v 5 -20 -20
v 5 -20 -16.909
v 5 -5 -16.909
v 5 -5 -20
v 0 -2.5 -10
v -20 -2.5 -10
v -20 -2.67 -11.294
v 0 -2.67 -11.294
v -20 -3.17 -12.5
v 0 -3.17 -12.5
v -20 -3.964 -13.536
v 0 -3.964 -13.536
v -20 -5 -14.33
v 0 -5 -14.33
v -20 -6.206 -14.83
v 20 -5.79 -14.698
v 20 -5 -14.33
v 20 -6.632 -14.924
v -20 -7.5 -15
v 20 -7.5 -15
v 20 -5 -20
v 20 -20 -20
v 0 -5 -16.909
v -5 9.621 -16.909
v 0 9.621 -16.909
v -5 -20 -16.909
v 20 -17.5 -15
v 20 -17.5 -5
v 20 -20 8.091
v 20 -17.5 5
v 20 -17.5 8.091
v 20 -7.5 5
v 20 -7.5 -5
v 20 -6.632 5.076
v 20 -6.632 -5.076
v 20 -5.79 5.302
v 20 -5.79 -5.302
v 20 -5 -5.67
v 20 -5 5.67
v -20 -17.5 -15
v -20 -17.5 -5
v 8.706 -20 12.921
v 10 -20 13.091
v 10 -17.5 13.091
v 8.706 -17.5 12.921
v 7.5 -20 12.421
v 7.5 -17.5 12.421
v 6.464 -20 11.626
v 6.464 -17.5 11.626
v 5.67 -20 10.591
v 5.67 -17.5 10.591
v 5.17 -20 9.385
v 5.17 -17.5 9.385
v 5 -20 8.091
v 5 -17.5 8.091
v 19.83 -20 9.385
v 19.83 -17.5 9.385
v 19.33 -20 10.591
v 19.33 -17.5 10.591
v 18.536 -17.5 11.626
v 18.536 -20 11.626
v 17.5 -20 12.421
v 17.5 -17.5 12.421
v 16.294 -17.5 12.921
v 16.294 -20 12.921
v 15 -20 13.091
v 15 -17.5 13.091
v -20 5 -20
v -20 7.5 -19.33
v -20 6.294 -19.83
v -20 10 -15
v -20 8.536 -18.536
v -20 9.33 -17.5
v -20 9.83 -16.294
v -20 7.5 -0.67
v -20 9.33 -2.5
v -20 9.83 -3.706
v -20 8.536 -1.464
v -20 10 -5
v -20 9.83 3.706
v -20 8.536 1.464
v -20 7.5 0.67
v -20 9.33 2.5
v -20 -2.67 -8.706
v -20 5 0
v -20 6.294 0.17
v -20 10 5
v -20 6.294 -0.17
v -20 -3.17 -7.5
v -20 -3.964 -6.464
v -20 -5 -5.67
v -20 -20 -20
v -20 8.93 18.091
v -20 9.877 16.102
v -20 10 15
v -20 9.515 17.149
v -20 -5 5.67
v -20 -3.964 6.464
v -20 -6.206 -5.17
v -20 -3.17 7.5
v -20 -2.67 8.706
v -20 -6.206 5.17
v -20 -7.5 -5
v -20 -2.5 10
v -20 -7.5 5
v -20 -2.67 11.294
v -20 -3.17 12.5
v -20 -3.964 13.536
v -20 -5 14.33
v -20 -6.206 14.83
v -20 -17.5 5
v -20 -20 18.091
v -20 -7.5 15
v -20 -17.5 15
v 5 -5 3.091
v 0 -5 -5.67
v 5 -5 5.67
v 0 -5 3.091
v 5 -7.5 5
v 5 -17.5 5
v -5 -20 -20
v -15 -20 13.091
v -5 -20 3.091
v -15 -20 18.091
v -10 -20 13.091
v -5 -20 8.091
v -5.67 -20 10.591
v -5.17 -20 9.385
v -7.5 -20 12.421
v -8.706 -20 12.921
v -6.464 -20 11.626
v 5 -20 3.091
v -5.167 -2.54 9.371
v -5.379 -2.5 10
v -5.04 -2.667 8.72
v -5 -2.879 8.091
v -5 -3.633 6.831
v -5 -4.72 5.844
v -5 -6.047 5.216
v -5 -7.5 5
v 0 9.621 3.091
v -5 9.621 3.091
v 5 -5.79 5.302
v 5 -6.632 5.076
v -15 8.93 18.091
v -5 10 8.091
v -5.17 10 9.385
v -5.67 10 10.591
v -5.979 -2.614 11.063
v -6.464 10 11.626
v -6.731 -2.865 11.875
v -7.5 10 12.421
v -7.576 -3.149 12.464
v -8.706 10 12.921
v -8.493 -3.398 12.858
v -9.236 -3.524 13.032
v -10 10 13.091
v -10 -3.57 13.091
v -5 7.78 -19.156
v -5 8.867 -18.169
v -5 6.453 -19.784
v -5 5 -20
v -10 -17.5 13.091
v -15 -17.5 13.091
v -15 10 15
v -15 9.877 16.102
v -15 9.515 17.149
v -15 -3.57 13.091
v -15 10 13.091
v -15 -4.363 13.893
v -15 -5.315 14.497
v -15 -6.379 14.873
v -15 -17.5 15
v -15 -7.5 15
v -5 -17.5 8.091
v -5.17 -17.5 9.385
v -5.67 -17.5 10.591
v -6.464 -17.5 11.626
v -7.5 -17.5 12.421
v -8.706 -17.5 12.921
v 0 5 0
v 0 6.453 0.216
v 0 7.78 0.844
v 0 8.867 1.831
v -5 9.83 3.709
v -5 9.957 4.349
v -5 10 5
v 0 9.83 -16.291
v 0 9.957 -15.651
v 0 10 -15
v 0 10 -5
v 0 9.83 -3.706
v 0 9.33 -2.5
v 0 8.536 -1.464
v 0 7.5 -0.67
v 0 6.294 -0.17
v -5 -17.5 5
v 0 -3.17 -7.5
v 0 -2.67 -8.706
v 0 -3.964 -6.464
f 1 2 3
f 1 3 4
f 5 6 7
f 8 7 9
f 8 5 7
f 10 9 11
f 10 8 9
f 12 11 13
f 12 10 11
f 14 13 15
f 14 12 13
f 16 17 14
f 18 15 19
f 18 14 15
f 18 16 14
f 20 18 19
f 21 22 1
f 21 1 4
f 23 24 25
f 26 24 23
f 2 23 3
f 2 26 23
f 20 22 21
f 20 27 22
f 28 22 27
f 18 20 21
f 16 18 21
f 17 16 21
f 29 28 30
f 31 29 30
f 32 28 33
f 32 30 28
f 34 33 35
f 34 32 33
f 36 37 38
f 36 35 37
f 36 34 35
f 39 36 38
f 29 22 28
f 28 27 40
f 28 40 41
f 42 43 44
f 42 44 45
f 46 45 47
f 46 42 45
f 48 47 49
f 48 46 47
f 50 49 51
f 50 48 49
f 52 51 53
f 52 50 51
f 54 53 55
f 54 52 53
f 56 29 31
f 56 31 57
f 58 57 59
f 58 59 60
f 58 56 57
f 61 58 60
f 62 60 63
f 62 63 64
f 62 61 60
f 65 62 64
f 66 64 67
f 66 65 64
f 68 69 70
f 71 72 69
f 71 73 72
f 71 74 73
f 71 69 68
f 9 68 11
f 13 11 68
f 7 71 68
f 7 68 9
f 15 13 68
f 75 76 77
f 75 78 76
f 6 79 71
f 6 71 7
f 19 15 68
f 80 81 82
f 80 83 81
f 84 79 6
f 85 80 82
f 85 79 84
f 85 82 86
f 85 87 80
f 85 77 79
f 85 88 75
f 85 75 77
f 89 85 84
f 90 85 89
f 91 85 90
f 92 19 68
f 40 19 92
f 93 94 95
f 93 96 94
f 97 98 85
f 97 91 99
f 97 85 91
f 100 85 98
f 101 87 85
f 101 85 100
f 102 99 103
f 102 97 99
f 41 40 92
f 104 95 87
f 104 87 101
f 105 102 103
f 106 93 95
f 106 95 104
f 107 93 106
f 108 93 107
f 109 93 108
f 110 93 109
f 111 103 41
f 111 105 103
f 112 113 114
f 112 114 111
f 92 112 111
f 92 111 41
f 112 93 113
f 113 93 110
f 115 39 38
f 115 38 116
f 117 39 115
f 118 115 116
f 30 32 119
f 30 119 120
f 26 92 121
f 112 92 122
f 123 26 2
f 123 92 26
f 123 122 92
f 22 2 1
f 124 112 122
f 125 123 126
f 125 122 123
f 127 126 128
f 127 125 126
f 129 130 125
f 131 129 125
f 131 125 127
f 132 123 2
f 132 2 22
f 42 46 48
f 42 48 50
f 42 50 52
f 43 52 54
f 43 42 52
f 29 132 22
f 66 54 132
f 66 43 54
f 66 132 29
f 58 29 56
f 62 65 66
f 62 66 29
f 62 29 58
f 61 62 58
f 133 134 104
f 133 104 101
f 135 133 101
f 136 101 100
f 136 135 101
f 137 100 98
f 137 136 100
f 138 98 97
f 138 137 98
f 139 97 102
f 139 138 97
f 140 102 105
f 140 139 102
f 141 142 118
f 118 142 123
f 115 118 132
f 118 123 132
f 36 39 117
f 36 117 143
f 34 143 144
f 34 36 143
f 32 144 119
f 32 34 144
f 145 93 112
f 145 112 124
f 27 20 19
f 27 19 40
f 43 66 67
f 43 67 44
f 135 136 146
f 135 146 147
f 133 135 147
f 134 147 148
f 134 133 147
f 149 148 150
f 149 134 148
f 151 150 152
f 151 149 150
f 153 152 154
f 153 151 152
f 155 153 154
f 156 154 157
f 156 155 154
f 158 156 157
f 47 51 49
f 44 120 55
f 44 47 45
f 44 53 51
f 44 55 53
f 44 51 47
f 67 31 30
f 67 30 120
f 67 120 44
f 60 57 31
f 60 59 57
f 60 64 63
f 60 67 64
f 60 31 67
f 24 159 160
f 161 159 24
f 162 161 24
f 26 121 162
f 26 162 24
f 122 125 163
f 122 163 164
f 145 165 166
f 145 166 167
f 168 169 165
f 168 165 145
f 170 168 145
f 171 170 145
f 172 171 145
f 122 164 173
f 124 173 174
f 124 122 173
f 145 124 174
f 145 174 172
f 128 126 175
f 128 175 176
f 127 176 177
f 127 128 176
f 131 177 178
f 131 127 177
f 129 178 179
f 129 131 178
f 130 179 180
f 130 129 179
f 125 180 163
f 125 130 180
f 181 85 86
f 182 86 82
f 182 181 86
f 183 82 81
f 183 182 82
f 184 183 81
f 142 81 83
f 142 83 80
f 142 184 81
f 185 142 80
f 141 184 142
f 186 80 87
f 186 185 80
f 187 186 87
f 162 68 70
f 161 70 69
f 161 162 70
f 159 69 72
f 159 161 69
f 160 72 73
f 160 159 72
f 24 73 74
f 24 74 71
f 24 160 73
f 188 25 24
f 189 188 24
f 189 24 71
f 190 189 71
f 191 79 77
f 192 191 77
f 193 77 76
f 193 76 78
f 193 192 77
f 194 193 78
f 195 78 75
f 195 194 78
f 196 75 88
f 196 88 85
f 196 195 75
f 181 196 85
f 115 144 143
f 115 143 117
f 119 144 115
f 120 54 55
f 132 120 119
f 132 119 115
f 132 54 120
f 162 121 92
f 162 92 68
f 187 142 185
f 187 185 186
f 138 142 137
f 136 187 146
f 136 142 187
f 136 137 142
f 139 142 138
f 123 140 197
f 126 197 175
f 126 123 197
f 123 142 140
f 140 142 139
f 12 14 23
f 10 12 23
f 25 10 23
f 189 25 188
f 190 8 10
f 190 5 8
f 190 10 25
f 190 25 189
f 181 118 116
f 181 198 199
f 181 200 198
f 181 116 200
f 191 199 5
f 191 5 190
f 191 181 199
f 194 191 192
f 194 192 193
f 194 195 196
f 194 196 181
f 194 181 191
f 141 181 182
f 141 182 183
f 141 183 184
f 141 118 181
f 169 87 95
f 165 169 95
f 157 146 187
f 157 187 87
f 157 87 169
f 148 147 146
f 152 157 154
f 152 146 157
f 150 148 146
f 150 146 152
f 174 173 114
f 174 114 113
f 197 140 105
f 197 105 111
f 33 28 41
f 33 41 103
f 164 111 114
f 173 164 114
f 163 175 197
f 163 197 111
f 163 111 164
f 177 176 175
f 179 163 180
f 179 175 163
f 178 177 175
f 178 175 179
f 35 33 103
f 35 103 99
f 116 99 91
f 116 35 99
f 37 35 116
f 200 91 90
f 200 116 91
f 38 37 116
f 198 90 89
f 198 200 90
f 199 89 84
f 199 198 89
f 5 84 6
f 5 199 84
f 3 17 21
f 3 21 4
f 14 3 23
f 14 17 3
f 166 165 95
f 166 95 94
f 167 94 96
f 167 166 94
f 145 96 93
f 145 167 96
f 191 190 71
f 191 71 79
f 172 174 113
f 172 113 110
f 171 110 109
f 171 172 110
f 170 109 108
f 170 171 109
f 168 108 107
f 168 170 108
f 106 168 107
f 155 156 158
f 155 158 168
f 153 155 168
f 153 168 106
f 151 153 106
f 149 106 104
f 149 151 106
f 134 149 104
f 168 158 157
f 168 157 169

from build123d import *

# Parameters (mm, degrees)
F3_DEPTH = 25
F4_DEPTH = 25
F2_W     = 5
F2_H     = 5
F2_W_2   = 10
F2_H_2   = 20
F5_DEPTH = 25


with BuildPart() as f3:
    # F0 (on Top) → F3 (new body, symmetric)
    with BuildSketch(Plane.XY):
        Polygon((0, 20), (-20, 20), (-20, -20), (20, -20), (20, -5), (0, -5), align=None)
    extrude(amount=F3_DEPTH, both=True)

    # F1 (on Right) → F4 (intersect, symmetric)
    with BuildSketch(Plane.YZ):
        with BuildLine():
            Line((5, 20), (-20, 20))
            Line((-20, 20), (-20, -20))
            Line((-20, -20), (5, -20))
            ThreePointArc((5, -20), (8.535534, -18.535534), (10, -15))
            Line((10, -15), (10, -5))
            ThreePointArc((10, -5), (8.535534, -1.464466), (5, 0))
            ThreePointArc((5, 0), (8.535534, 1.464466), (10, 5))
            Line((10, 5), (10, 15))
            ThreePointArc((10, 15), (8.535534, 18.535534), (5, 20))
        make_face()
        with BuildLine():
            Line((-17.5, -5), (-7.5, -5))
            ThreePointArc((-7.5, -5), (-3.964466, -6.464466), (-2.5, -10))
            ThreePointArc((-2.5, -10), (-3.964466, -13.535534), (-7.5, -15))
            Line((-7.5, -15), (-17.5, -15))
            Line((-17.5, -15), (-17.5, -5))
        make_face(mode=Mode.SUBTRACT)
        with BuildLine():
            Line((-17.5, 15), (-7.5, 15))
            ThreePointArc((-7.5, 15), (-3.964466, 13.535534), (-2.5, 10))
            ThreePointArc((-2.5, 10), (-3.964466, 6.464466), (-7.5, 5))
            Line((-7.5, 5), (-17.5, 5))
            Line((-17.5, 5), (-17.5, 15))
        make_face(mode=Mode.SUBTRACT)
    extrude(amount=F4_DEPTH, both=True, mode=Mode.INTERSECT)

    # F2 (on Front) → F5 (intersect, symmetric)
    with BuildSketch(Plane.XZ):
        with Locations((-17.5, 15.590909)):
            Rectangle(F2_W, F2_H)
        with BuildLine():
            Line((-15, 13.090909), (-20, 13.090909))
            Line((-20, 13.090909), (-20, -21.909091))
            Line((-20, -21.909091), (-5, -21.909091))
            Line((-5, -21.909091), (-5, -16.909091))
            Line((-5, -16.909091), (-5, 3.090909))
            Line((-5, 3.090909), (-5, 8.090909))
            ThreePointArc((-5, 8.090909), (-6.464466, 11.626443), (-10, 13.090909))
            Line((-10, 13.090909), (-15, 13.090909))
        make_face()
        with Locations((0, -6.909091)):
            Rectangle(F2_W_2, F2_H_2)
        with BuildLine():
            Line((5, 3.090909), (5, -16.909091))
            Line((5, -16.909091), (5, -21.909091))
            Line((5, -21.909091), (20, -21.909091))
            Line((20, -21.909091), (20, 8.090909))
            ThreePointArc((20, 8.090909), (18.535534, 11.626443), (15, 13.090909))
            Line((15, 13.090909), (10, 13.090909))
            ThreePointArc((10, 13.090909), (6.464466, 11.626443), (5, 8.090909))
            Line((5, 8.090909), (5, 3.090909))
        make_face()
    extrude(amount=F5_DEPTH, both=True, mode=Mode.INTERSECT)


solid = f3.part
